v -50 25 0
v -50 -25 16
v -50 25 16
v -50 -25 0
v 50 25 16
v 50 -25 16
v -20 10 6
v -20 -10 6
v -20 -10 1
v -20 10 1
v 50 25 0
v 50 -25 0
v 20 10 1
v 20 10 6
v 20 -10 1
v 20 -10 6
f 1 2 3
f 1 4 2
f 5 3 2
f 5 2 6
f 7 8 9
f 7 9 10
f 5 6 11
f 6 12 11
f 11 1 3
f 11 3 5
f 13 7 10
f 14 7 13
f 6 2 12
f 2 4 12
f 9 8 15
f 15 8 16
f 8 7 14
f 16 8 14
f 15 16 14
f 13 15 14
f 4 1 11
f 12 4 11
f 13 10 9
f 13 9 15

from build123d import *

# Parameters (mm, degrees)
SKETCH_W     = 100
SKETCH_H     = 50
PAD_DEPTH    = 6
SKETCH001_W  = 40
SKETCH001_H  = 20
POCKET_DEPTH = 5
SKETCH003_W  = 100
SKETCH003_H  = 50
PAD001_DEPTH = 10


with BuildPart() as part:
    # Sketch → Pad (new body)
    with BuildSketch(Plane.XY):
        Rectangle(SKETCH_W, SKETCH_H)
    extrude(amount=PAD_DEPTH)

    # Sketch001 (on Face6 of Pad) → Pocket (cut)
    with BuildSketch(Plane.XY.offset(6)):
        Rectangle(SKETCH001_W, SKETCH001_H)
    extrude(amount=-POCKET_DEPTH, mode=Mode.SUBTRACT)

    # Sketch003 (on Face5 of Pocket) → Pad001 (join)
    with BuildSketch(Plane.XY.offset(6)):
        Rectangle(SKETCH003_W, SKETCH003_H)
    extrude(amount=PAD001_DEPTH)


solid = part.part
